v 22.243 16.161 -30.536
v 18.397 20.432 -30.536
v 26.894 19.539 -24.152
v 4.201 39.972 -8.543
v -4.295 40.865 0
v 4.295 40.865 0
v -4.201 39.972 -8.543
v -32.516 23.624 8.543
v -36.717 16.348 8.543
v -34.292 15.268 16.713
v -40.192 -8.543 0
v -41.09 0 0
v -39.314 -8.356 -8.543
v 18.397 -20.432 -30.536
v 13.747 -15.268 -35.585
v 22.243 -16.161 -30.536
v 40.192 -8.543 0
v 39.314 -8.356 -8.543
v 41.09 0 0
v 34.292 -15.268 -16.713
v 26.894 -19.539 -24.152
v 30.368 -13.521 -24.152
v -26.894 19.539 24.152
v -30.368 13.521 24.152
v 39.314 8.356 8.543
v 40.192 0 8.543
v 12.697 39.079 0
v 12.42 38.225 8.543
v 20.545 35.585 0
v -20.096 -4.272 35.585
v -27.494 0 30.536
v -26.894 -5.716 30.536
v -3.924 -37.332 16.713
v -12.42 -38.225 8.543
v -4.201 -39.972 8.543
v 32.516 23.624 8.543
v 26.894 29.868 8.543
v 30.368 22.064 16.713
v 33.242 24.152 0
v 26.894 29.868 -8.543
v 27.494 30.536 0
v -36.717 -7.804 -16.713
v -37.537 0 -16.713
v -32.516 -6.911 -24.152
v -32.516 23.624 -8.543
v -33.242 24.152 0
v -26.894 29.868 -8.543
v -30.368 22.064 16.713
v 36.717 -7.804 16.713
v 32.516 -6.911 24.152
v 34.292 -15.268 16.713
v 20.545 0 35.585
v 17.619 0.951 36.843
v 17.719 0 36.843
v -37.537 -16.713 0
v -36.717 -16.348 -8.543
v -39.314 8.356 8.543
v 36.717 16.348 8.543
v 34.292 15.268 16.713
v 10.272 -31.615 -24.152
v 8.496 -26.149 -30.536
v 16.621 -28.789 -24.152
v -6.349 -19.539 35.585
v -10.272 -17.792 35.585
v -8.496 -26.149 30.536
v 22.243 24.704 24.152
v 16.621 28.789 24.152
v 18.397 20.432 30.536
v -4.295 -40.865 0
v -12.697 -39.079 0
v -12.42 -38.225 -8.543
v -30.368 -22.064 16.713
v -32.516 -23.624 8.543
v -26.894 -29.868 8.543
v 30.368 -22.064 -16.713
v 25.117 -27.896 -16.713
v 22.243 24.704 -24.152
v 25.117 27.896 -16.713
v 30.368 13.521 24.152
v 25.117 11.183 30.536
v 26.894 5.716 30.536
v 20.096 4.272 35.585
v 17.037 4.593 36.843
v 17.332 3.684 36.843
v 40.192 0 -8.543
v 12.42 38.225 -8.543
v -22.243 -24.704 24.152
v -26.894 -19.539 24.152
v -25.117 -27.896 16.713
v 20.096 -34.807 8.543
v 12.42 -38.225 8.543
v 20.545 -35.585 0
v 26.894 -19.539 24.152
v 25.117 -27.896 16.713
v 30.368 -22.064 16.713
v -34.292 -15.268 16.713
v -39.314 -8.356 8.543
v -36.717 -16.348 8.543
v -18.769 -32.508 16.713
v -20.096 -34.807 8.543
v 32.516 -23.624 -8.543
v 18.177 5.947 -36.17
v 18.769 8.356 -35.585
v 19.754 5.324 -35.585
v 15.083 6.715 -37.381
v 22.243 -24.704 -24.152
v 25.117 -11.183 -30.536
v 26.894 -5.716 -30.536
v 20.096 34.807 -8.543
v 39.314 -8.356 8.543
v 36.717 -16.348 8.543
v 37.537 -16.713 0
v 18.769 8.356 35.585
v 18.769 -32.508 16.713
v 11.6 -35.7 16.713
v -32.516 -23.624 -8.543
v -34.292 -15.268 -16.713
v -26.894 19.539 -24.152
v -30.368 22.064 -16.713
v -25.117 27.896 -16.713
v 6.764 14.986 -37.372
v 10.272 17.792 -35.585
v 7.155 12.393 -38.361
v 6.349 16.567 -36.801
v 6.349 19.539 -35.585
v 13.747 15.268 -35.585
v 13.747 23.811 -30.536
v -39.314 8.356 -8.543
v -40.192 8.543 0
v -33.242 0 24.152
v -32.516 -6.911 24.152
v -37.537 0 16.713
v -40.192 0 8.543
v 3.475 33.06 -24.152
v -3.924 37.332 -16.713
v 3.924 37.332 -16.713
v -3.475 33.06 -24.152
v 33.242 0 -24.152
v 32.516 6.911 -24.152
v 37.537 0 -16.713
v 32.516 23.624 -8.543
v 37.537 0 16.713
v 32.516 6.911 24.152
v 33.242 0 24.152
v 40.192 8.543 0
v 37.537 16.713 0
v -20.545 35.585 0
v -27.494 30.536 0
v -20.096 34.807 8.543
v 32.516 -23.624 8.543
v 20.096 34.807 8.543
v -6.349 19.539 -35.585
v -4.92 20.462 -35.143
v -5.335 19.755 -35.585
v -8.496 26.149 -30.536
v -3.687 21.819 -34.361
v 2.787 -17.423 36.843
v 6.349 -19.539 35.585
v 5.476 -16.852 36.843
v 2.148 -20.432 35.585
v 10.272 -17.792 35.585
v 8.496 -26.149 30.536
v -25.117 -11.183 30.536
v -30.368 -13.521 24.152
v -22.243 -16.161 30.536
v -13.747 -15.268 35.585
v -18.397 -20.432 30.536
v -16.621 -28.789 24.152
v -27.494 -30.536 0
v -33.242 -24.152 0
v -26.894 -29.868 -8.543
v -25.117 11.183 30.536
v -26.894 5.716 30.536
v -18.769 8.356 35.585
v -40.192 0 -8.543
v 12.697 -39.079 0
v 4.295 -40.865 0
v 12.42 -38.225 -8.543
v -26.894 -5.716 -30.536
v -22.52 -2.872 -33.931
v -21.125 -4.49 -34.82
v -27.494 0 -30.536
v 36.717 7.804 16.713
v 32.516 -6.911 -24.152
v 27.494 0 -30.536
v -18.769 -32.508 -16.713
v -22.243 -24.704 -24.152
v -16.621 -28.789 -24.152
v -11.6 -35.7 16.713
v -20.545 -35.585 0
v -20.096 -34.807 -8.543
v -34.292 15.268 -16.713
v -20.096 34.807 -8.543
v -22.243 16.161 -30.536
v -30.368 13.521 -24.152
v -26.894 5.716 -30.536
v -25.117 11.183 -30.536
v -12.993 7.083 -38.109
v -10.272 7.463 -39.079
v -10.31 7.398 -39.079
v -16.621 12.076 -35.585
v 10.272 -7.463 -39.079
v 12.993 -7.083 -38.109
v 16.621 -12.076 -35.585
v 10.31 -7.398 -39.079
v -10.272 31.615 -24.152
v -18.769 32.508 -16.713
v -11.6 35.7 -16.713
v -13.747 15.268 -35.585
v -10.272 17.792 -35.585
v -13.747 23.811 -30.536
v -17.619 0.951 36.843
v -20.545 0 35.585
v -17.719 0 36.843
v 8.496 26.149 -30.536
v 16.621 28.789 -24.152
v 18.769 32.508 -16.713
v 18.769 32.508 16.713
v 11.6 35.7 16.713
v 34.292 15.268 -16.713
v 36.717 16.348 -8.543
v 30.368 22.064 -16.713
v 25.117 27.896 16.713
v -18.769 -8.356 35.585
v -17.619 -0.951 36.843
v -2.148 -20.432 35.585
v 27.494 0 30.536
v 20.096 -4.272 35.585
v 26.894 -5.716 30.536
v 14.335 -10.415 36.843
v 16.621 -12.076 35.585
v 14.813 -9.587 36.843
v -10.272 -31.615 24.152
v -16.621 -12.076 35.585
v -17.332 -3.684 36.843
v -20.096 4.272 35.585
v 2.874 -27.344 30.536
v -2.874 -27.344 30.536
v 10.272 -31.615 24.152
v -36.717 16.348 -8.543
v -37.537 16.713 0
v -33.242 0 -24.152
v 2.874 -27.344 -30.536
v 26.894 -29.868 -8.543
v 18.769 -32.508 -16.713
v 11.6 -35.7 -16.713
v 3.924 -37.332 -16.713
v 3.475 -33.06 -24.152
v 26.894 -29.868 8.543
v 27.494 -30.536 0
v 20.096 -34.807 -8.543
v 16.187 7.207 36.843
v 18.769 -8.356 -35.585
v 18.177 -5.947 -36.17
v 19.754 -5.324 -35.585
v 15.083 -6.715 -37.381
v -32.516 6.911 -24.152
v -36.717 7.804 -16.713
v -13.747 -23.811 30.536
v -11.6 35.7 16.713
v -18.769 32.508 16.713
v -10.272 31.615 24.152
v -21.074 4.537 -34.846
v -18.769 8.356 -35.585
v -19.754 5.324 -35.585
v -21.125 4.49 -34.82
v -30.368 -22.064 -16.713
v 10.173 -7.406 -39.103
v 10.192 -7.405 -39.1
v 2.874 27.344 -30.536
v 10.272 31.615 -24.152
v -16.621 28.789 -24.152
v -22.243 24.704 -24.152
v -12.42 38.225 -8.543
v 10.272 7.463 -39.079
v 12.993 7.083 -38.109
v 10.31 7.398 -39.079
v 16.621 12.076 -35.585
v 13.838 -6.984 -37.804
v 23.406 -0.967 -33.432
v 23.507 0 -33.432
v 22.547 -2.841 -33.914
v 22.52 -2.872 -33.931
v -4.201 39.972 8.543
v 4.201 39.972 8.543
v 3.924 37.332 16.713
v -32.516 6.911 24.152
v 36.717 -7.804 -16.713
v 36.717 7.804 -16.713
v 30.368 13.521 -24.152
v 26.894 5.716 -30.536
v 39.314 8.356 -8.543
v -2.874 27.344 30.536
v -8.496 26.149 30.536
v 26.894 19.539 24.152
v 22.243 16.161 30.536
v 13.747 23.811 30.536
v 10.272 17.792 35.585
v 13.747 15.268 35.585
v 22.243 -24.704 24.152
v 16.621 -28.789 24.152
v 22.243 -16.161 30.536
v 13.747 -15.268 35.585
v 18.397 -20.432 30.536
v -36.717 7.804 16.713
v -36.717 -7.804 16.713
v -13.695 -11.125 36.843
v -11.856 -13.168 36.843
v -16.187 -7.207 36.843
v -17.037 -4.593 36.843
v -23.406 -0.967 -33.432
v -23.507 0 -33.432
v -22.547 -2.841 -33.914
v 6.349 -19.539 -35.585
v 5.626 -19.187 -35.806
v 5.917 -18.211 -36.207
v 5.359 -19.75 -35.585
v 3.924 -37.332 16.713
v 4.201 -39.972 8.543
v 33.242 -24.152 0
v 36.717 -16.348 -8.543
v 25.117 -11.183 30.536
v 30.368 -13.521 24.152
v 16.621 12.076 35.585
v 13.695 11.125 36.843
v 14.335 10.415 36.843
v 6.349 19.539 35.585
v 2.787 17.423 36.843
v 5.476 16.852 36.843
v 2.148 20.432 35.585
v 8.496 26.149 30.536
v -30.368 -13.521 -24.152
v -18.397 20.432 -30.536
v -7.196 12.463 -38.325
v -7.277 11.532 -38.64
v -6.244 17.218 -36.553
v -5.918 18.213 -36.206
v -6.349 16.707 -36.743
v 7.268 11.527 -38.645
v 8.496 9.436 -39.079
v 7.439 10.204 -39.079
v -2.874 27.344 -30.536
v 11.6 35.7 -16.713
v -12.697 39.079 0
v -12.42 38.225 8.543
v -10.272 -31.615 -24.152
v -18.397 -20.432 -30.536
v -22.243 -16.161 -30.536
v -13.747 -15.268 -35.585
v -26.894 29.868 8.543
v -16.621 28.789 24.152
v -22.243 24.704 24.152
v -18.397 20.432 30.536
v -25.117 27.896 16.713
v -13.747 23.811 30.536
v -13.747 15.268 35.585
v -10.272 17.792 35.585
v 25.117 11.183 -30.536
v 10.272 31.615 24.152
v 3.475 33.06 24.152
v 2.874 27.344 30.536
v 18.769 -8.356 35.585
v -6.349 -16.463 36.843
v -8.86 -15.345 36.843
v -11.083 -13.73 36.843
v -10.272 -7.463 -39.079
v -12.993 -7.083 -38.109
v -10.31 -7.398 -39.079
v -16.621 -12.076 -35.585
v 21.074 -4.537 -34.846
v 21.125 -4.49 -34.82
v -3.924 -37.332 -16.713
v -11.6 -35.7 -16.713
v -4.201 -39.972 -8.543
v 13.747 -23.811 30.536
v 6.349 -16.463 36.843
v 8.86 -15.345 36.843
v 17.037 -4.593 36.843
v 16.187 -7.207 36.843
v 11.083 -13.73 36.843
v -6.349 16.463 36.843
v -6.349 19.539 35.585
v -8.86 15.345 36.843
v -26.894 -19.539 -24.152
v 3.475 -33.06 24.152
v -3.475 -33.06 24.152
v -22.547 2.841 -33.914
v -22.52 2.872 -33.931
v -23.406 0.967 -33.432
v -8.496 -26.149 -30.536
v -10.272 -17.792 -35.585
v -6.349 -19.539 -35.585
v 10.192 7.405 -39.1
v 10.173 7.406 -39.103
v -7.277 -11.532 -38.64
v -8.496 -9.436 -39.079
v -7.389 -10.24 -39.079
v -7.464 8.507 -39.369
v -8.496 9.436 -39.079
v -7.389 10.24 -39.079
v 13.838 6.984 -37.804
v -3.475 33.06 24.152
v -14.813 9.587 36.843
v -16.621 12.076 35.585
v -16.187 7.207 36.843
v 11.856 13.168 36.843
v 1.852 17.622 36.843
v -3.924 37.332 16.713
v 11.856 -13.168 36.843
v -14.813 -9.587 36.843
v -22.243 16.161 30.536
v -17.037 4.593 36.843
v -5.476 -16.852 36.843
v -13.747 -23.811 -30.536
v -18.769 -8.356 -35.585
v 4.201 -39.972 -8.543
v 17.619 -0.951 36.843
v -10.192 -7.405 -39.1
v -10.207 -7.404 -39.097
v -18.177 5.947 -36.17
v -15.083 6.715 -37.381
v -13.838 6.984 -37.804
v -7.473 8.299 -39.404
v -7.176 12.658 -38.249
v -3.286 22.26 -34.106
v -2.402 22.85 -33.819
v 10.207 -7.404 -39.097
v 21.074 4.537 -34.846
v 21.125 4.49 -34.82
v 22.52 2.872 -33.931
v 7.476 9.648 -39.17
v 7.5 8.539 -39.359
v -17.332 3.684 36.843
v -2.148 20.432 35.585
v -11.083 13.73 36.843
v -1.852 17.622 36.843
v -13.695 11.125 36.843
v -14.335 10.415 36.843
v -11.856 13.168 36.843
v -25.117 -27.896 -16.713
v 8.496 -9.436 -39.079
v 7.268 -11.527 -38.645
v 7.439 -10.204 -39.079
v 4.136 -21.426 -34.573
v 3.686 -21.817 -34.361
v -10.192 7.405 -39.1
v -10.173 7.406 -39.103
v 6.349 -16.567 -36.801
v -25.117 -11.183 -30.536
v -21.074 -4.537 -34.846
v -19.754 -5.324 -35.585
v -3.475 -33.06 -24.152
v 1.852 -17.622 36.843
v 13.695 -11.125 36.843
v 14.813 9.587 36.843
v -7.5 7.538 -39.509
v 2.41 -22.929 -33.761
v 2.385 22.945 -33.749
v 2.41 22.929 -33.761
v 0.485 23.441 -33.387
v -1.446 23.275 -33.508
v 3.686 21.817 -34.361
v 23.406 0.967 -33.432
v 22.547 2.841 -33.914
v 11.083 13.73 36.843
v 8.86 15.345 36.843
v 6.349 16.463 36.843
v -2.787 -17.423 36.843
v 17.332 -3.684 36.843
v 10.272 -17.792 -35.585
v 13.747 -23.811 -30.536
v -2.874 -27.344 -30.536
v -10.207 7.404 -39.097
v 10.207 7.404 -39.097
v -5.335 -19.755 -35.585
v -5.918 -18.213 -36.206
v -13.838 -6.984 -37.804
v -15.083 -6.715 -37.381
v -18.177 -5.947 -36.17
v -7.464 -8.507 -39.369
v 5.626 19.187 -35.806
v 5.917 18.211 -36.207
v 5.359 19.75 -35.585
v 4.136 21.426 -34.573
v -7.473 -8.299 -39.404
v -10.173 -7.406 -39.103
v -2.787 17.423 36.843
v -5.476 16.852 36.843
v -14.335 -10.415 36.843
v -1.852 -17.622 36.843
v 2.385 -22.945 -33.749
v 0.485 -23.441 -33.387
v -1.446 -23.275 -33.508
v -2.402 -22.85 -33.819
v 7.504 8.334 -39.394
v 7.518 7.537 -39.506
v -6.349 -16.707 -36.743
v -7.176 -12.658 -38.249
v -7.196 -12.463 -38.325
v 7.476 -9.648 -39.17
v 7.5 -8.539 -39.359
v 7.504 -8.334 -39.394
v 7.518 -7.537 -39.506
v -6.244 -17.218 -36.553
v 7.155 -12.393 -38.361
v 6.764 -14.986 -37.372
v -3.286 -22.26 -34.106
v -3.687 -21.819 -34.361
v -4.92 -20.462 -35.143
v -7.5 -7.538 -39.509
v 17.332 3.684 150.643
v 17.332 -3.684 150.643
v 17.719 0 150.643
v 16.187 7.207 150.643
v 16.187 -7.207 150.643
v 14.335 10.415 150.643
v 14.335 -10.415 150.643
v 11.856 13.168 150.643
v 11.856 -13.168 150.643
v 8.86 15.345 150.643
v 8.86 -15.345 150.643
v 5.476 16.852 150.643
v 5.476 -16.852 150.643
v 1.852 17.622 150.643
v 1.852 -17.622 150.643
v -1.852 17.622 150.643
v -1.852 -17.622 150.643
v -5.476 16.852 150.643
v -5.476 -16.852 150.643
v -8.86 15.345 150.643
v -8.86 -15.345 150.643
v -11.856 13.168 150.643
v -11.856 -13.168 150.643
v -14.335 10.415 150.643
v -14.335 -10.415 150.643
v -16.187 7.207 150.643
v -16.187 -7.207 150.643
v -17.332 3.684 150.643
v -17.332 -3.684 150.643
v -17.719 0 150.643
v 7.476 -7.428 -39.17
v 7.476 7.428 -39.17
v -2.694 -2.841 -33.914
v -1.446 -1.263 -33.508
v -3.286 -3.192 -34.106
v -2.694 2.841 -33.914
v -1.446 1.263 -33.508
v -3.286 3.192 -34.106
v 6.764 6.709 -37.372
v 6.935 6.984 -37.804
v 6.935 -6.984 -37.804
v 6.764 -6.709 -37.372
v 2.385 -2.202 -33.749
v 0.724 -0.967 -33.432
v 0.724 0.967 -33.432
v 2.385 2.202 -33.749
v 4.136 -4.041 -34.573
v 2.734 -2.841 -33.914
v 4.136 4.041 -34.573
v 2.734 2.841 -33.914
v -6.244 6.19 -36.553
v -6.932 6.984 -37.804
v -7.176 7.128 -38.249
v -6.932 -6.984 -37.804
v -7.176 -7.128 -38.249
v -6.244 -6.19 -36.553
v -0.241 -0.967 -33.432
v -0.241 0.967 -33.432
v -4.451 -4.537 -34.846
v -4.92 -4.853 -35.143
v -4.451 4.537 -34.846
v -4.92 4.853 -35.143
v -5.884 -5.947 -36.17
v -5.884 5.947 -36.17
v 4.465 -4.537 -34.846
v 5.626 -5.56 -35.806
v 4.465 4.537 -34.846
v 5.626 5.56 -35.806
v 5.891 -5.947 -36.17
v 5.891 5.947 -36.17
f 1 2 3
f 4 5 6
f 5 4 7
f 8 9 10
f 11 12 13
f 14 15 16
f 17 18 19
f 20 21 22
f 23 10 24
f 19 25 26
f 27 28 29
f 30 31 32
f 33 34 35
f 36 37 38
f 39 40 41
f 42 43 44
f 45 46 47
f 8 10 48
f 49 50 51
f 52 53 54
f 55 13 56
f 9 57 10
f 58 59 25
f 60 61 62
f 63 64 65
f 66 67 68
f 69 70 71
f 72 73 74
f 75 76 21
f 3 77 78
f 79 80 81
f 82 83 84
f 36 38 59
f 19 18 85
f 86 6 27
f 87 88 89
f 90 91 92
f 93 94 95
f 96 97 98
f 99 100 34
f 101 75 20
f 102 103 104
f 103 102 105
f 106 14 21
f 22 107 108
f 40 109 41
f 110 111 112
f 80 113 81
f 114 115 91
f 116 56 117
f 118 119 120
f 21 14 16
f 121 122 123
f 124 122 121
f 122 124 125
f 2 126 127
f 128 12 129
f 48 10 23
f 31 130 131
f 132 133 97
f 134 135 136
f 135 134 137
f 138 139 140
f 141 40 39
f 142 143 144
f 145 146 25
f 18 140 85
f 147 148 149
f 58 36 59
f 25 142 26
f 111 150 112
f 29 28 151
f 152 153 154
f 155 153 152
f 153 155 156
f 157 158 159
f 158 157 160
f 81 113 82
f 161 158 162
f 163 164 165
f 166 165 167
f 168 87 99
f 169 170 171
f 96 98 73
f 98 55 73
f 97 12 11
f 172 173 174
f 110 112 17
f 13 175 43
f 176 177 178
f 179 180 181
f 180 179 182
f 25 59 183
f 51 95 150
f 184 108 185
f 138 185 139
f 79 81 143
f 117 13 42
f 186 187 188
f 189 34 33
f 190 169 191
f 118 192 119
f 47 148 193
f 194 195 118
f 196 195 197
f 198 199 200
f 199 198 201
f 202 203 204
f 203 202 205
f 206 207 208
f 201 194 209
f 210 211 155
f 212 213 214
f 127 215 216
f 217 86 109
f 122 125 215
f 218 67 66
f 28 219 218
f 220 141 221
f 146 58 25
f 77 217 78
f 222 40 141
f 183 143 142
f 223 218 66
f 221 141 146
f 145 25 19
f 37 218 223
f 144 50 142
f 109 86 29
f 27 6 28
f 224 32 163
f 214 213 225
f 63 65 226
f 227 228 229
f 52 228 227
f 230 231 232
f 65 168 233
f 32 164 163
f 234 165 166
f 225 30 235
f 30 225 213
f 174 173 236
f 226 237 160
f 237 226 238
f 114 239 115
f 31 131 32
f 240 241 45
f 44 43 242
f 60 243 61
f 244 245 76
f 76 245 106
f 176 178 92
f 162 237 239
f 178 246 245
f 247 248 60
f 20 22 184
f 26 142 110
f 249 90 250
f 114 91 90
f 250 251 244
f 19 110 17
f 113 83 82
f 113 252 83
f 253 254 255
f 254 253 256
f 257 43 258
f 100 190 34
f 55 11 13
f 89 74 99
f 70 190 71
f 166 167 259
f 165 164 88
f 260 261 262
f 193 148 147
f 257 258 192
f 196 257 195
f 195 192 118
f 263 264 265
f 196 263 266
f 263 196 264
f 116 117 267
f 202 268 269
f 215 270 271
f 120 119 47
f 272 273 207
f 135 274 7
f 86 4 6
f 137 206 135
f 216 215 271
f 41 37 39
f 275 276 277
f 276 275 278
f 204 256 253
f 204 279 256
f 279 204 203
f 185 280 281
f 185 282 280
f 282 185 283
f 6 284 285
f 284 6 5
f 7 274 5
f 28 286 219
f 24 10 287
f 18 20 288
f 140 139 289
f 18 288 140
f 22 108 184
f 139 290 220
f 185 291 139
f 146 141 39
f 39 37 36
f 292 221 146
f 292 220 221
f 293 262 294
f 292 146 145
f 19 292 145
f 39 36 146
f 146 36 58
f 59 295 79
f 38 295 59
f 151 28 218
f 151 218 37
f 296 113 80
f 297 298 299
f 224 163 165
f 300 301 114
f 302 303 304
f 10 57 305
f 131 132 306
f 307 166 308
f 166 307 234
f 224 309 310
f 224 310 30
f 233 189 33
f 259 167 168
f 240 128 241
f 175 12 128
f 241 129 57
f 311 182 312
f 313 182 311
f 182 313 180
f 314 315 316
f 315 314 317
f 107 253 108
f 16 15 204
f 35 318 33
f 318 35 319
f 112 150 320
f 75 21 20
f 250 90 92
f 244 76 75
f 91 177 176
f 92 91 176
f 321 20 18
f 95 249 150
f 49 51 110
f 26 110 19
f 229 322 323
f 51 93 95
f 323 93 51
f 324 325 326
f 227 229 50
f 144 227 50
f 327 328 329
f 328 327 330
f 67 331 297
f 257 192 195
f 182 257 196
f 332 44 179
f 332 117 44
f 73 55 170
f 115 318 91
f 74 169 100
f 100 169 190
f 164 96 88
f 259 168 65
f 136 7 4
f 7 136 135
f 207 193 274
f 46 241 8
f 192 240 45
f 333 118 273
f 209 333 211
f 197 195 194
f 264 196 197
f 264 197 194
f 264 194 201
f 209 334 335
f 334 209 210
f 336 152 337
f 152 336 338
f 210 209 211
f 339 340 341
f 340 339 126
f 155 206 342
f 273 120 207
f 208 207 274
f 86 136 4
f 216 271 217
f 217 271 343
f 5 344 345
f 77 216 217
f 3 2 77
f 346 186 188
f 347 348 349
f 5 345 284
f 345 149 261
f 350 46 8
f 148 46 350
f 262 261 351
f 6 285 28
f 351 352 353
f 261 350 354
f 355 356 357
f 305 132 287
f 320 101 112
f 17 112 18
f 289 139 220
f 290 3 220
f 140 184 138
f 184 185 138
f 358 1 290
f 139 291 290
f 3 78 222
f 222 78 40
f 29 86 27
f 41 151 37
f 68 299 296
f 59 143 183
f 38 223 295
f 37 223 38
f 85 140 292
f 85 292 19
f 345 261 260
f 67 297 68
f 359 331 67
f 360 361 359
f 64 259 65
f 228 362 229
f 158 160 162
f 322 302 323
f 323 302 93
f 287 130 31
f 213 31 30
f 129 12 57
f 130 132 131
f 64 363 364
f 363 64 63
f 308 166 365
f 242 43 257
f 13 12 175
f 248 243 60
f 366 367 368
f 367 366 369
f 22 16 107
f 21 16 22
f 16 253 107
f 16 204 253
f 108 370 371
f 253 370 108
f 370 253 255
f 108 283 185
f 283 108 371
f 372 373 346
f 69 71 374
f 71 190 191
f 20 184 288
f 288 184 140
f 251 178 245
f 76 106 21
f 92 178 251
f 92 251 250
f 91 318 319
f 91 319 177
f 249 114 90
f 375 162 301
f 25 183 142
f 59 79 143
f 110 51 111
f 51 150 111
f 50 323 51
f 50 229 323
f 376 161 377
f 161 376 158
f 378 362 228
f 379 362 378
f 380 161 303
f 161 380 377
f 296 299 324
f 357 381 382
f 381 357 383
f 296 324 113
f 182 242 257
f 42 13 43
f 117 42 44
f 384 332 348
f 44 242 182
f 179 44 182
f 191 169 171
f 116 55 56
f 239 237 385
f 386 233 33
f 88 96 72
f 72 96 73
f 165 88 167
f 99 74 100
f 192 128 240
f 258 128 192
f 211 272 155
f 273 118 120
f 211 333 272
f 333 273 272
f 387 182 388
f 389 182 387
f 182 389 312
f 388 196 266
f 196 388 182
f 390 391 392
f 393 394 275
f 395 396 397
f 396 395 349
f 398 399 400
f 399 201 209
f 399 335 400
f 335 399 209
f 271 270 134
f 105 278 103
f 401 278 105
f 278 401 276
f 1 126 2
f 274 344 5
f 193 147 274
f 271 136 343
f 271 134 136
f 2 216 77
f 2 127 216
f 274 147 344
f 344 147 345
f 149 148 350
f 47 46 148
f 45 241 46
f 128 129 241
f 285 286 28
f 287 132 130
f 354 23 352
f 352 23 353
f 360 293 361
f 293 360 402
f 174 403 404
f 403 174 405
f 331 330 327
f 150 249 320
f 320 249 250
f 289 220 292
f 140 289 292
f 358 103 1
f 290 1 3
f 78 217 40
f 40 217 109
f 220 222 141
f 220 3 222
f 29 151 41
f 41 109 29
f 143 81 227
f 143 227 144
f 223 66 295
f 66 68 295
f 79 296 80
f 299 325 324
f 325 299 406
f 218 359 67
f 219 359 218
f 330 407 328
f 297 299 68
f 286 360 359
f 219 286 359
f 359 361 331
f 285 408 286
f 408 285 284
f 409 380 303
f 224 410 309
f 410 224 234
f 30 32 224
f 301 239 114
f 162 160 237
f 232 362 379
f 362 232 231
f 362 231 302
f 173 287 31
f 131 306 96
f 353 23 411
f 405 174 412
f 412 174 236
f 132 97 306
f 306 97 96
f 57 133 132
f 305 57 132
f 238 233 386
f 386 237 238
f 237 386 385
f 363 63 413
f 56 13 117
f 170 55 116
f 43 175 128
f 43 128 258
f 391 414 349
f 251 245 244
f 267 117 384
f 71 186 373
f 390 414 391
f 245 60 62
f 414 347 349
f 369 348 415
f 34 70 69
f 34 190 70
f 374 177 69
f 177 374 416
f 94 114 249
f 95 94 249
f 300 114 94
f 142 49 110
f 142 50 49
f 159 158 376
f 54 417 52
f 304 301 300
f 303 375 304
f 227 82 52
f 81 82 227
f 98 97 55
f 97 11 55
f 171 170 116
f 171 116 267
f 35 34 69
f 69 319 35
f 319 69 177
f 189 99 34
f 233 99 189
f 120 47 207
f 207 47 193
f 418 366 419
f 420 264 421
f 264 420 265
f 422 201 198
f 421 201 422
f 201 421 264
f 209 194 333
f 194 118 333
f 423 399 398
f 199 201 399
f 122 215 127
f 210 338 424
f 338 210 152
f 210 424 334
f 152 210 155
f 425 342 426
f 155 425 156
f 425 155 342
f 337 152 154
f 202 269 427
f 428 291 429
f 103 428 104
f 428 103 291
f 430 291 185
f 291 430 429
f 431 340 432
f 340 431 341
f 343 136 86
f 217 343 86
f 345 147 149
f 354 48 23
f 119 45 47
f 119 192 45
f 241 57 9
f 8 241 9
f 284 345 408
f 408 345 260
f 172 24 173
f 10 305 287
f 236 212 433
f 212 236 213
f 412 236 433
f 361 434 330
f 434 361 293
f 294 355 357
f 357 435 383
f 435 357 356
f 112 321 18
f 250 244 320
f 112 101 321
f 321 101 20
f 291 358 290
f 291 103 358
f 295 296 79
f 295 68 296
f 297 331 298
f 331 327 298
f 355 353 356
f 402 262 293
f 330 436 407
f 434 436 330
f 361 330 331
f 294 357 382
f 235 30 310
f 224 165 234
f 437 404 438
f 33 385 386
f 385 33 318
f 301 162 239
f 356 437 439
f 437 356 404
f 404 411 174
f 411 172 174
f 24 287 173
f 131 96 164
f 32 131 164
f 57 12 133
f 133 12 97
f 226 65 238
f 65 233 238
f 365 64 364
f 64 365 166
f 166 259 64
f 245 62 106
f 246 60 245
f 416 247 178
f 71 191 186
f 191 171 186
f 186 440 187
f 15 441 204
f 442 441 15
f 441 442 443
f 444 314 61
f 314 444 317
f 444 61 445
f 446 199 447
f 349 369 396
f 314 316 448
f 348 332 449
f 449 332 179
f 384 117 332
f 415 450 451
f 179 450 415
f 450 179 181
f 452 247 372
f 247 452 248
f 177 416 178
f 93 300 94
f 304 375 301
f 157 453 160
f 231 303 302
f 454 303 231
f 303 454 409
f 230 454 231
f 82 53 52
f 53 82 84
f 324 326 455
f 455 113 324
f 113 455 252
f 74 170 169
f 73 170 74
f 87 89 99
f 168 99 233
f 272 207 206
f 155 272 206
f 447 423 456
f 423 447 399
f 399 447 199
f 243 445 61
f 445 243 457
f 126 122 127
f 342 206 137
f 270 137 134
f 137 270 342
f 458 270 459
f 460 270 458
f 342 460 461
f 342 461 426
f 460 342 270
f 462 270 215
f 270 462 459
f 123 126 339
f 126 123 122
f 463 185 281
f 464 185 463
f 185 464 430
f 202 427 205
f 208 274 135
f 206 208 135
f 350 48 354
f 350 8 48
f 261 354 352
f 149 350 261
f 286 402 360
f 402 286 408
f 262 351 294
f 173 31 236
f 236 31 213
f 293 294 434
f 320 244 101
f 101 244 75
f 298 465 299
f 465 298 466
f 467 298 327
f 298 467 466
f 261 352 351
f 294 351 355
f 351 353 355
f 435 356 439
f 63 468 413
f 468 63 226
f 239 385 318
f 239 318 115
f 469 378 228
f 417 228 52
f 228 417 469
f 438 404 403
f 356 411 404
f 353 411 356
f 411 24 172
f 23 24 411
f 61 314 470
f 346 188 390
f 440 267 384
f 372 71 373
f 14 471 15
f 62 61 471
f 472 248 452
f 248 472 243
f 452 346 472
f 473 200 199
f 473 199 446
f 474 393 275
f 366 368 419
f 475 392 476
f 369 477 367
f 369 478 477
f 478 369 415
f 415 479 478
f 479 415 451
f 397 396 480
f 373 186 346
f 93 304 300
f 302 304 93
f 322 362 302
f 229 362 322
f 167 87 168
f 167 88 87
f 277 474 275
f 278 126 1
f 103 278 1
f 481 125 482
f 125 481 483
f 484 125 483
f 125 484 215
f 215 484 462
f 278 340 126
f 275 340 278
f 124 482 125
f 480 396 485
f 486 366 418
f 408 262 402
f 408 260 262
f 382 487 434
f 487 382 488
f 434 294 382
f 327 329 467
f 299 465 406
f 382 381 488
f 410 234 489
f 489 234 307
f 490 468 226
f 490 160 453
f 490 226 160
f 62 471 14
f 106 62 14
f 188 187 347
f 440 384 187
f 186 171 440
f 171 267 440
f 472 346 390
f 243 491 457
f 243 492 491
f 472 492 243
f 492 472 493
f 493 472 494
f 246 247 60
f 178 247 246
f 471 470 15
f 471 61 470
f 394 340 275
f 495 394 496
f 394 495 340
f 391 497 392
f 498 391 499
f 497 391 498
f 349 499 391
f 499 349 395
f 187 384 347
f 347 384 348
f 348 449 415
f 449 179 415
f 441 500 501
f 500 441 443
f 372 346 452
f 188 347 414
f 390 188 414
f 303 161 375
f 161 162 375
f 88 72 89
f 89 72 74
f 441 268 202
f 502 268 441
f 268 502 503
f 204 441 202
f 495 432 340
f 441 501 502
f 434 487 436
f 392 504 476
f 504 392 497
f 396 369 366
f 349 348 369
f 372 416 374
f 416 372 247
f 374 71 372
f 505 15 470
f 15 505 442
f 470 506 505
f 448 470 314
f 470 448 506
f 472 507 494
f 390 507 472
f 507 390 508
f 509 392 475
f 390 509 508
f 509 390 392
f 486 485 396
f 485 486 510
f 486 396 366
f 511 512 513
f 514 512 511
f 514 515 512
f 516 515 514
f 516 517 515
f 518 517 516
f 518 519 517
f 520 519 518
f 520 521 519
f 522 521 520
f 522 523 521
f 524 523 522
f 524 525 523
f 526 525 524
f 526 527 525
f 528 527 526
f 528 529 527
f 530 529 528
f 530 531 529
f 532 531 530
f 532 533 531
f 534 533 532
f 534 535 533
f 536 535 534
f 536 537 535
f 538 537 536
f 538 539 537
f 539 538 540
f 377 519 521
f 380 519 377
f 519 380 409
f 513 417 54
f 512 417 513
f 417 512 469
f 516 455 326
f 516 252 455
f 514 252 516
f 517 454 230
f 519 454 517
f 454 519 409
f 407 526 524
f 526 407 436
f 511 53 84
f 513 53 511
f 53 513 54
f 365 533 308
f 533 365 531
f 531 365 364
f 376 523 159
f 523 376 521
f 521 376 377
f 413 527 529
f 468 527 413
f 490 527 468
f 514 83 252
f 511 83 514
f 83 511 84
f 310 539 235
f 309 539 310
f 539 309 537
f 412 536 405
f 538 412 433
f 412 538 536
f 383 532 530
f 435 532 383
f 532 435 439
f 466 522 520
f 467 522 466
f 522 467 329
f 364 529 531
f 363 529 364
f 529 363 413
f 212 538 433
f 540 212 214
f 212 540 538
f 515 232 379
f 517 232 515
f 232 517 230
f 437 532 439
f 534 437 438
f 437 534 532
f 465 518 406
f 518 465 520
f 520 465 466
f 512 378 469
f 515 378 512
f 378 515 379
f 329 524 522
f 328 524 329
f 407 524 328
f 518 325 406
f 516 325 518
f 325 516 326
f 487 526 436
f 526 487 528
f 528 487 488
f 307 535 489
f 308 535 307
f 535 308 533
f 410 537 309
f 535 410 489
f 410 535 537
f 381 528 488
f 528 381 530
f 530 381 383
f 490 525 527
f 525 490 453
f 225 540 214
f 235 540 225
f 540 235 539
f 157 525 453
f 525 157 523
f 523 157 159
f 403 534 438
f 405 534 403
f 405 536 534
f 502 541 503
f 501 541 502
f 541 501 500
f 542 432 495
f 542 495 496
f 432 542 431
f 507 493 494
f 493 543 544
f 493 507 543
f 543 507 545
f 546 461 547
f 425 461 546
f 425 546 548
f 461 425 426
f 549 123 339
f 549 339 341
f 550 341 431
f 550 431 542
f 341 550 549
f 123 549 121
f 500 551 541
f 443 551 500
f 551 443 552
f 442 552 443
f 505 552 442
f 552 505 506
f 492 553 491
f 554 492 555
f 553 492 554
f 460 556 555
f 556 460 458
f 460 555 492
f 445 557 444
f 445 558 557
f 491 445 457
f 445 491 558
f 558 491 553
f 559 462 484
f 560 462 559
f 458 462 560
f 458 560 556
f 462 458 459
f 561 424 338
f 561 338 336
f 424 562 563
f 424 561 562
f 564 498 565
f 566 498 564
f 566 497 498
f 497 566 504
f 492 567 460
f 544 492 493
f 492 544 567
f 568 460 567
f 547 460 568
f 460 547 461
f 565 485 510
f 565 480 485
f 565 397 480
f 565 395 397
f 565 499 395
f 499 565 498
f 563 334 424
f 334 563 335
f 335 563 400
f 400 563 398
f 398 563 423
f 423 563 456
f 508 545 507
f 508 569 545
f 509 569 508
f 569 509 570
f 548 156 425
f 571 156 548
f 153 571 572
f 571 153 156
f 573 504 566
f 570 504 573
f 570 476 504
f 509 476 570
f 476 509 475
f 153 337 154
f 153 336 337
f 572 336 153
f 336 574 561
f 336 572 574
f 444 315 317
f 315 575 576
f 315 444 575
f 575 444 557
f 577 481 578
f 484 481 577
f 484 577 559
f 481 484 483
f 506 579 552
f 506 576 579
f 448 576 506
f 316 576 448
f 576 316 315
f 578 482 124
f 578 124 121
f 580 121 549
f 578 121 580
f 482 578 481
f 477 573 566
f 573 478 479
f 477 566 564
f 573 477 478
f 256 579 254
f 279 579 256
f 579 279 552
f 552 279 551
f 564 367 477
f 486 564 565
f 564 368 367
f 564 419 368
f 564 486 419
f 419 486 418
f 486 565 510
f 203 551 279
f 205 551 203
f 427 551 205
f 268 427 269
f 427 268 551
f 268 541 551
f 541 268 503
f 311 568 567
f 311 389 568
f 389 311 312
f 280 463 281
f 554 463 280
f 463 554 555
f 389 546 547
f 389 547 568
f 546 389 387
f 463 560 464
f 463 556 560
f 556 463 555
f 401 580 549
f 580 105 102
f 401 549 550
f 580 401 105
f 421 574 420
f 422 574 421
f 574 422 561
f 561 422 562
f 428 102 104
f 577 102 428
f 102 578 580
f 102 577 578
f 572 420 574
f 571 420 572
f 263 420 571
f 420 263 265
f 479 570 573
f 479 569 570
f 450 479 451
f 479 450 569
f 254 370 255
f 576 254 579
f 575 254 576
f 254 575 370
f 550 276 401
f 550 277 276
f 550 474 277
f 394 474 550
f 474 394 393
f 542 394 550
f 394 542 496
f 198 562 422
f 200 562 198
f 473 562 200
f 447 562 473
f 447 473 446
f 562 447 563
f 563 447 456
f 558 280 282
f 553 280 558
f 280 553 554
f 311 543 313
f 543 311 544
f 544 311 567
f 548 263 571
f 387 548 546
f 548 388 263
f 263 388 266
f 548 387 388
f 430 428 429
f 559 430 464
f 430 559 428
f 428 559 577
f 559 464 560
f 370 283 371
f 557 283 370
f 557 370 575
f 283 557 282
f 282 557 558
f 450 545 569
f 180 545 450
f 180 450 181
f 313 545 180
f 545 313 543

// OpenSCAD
seed = 14;
seeds = rands(0,1000000,10,seed);
head_size = rands(25,50,1,seeds[1])[0];
bolt_length = rands(head_size*2,200,1,seeds[3])[0];
bolt_radius = rands(head_size/3, head_size/2,1,seeds[0])[0];
cylinder_size = rands(head_size/7, head_size/4,1, seeds[4])[0];


difference(){
    union(){
        sphere(head_size);
        cylinder(bolt_length,bolt_radius,bolt_radius);
    }
    translate([0,0,-head_size]){
        rotate([90, 0, 0]){
            cylinder(head_size*2, cylinder_size, cylinder_size, center=true);
        }
        rotate([0, 90, 0]){
            cylinder(head_size*2, cylinder_size, cylinder_size, center=true);
        }
    }
}
